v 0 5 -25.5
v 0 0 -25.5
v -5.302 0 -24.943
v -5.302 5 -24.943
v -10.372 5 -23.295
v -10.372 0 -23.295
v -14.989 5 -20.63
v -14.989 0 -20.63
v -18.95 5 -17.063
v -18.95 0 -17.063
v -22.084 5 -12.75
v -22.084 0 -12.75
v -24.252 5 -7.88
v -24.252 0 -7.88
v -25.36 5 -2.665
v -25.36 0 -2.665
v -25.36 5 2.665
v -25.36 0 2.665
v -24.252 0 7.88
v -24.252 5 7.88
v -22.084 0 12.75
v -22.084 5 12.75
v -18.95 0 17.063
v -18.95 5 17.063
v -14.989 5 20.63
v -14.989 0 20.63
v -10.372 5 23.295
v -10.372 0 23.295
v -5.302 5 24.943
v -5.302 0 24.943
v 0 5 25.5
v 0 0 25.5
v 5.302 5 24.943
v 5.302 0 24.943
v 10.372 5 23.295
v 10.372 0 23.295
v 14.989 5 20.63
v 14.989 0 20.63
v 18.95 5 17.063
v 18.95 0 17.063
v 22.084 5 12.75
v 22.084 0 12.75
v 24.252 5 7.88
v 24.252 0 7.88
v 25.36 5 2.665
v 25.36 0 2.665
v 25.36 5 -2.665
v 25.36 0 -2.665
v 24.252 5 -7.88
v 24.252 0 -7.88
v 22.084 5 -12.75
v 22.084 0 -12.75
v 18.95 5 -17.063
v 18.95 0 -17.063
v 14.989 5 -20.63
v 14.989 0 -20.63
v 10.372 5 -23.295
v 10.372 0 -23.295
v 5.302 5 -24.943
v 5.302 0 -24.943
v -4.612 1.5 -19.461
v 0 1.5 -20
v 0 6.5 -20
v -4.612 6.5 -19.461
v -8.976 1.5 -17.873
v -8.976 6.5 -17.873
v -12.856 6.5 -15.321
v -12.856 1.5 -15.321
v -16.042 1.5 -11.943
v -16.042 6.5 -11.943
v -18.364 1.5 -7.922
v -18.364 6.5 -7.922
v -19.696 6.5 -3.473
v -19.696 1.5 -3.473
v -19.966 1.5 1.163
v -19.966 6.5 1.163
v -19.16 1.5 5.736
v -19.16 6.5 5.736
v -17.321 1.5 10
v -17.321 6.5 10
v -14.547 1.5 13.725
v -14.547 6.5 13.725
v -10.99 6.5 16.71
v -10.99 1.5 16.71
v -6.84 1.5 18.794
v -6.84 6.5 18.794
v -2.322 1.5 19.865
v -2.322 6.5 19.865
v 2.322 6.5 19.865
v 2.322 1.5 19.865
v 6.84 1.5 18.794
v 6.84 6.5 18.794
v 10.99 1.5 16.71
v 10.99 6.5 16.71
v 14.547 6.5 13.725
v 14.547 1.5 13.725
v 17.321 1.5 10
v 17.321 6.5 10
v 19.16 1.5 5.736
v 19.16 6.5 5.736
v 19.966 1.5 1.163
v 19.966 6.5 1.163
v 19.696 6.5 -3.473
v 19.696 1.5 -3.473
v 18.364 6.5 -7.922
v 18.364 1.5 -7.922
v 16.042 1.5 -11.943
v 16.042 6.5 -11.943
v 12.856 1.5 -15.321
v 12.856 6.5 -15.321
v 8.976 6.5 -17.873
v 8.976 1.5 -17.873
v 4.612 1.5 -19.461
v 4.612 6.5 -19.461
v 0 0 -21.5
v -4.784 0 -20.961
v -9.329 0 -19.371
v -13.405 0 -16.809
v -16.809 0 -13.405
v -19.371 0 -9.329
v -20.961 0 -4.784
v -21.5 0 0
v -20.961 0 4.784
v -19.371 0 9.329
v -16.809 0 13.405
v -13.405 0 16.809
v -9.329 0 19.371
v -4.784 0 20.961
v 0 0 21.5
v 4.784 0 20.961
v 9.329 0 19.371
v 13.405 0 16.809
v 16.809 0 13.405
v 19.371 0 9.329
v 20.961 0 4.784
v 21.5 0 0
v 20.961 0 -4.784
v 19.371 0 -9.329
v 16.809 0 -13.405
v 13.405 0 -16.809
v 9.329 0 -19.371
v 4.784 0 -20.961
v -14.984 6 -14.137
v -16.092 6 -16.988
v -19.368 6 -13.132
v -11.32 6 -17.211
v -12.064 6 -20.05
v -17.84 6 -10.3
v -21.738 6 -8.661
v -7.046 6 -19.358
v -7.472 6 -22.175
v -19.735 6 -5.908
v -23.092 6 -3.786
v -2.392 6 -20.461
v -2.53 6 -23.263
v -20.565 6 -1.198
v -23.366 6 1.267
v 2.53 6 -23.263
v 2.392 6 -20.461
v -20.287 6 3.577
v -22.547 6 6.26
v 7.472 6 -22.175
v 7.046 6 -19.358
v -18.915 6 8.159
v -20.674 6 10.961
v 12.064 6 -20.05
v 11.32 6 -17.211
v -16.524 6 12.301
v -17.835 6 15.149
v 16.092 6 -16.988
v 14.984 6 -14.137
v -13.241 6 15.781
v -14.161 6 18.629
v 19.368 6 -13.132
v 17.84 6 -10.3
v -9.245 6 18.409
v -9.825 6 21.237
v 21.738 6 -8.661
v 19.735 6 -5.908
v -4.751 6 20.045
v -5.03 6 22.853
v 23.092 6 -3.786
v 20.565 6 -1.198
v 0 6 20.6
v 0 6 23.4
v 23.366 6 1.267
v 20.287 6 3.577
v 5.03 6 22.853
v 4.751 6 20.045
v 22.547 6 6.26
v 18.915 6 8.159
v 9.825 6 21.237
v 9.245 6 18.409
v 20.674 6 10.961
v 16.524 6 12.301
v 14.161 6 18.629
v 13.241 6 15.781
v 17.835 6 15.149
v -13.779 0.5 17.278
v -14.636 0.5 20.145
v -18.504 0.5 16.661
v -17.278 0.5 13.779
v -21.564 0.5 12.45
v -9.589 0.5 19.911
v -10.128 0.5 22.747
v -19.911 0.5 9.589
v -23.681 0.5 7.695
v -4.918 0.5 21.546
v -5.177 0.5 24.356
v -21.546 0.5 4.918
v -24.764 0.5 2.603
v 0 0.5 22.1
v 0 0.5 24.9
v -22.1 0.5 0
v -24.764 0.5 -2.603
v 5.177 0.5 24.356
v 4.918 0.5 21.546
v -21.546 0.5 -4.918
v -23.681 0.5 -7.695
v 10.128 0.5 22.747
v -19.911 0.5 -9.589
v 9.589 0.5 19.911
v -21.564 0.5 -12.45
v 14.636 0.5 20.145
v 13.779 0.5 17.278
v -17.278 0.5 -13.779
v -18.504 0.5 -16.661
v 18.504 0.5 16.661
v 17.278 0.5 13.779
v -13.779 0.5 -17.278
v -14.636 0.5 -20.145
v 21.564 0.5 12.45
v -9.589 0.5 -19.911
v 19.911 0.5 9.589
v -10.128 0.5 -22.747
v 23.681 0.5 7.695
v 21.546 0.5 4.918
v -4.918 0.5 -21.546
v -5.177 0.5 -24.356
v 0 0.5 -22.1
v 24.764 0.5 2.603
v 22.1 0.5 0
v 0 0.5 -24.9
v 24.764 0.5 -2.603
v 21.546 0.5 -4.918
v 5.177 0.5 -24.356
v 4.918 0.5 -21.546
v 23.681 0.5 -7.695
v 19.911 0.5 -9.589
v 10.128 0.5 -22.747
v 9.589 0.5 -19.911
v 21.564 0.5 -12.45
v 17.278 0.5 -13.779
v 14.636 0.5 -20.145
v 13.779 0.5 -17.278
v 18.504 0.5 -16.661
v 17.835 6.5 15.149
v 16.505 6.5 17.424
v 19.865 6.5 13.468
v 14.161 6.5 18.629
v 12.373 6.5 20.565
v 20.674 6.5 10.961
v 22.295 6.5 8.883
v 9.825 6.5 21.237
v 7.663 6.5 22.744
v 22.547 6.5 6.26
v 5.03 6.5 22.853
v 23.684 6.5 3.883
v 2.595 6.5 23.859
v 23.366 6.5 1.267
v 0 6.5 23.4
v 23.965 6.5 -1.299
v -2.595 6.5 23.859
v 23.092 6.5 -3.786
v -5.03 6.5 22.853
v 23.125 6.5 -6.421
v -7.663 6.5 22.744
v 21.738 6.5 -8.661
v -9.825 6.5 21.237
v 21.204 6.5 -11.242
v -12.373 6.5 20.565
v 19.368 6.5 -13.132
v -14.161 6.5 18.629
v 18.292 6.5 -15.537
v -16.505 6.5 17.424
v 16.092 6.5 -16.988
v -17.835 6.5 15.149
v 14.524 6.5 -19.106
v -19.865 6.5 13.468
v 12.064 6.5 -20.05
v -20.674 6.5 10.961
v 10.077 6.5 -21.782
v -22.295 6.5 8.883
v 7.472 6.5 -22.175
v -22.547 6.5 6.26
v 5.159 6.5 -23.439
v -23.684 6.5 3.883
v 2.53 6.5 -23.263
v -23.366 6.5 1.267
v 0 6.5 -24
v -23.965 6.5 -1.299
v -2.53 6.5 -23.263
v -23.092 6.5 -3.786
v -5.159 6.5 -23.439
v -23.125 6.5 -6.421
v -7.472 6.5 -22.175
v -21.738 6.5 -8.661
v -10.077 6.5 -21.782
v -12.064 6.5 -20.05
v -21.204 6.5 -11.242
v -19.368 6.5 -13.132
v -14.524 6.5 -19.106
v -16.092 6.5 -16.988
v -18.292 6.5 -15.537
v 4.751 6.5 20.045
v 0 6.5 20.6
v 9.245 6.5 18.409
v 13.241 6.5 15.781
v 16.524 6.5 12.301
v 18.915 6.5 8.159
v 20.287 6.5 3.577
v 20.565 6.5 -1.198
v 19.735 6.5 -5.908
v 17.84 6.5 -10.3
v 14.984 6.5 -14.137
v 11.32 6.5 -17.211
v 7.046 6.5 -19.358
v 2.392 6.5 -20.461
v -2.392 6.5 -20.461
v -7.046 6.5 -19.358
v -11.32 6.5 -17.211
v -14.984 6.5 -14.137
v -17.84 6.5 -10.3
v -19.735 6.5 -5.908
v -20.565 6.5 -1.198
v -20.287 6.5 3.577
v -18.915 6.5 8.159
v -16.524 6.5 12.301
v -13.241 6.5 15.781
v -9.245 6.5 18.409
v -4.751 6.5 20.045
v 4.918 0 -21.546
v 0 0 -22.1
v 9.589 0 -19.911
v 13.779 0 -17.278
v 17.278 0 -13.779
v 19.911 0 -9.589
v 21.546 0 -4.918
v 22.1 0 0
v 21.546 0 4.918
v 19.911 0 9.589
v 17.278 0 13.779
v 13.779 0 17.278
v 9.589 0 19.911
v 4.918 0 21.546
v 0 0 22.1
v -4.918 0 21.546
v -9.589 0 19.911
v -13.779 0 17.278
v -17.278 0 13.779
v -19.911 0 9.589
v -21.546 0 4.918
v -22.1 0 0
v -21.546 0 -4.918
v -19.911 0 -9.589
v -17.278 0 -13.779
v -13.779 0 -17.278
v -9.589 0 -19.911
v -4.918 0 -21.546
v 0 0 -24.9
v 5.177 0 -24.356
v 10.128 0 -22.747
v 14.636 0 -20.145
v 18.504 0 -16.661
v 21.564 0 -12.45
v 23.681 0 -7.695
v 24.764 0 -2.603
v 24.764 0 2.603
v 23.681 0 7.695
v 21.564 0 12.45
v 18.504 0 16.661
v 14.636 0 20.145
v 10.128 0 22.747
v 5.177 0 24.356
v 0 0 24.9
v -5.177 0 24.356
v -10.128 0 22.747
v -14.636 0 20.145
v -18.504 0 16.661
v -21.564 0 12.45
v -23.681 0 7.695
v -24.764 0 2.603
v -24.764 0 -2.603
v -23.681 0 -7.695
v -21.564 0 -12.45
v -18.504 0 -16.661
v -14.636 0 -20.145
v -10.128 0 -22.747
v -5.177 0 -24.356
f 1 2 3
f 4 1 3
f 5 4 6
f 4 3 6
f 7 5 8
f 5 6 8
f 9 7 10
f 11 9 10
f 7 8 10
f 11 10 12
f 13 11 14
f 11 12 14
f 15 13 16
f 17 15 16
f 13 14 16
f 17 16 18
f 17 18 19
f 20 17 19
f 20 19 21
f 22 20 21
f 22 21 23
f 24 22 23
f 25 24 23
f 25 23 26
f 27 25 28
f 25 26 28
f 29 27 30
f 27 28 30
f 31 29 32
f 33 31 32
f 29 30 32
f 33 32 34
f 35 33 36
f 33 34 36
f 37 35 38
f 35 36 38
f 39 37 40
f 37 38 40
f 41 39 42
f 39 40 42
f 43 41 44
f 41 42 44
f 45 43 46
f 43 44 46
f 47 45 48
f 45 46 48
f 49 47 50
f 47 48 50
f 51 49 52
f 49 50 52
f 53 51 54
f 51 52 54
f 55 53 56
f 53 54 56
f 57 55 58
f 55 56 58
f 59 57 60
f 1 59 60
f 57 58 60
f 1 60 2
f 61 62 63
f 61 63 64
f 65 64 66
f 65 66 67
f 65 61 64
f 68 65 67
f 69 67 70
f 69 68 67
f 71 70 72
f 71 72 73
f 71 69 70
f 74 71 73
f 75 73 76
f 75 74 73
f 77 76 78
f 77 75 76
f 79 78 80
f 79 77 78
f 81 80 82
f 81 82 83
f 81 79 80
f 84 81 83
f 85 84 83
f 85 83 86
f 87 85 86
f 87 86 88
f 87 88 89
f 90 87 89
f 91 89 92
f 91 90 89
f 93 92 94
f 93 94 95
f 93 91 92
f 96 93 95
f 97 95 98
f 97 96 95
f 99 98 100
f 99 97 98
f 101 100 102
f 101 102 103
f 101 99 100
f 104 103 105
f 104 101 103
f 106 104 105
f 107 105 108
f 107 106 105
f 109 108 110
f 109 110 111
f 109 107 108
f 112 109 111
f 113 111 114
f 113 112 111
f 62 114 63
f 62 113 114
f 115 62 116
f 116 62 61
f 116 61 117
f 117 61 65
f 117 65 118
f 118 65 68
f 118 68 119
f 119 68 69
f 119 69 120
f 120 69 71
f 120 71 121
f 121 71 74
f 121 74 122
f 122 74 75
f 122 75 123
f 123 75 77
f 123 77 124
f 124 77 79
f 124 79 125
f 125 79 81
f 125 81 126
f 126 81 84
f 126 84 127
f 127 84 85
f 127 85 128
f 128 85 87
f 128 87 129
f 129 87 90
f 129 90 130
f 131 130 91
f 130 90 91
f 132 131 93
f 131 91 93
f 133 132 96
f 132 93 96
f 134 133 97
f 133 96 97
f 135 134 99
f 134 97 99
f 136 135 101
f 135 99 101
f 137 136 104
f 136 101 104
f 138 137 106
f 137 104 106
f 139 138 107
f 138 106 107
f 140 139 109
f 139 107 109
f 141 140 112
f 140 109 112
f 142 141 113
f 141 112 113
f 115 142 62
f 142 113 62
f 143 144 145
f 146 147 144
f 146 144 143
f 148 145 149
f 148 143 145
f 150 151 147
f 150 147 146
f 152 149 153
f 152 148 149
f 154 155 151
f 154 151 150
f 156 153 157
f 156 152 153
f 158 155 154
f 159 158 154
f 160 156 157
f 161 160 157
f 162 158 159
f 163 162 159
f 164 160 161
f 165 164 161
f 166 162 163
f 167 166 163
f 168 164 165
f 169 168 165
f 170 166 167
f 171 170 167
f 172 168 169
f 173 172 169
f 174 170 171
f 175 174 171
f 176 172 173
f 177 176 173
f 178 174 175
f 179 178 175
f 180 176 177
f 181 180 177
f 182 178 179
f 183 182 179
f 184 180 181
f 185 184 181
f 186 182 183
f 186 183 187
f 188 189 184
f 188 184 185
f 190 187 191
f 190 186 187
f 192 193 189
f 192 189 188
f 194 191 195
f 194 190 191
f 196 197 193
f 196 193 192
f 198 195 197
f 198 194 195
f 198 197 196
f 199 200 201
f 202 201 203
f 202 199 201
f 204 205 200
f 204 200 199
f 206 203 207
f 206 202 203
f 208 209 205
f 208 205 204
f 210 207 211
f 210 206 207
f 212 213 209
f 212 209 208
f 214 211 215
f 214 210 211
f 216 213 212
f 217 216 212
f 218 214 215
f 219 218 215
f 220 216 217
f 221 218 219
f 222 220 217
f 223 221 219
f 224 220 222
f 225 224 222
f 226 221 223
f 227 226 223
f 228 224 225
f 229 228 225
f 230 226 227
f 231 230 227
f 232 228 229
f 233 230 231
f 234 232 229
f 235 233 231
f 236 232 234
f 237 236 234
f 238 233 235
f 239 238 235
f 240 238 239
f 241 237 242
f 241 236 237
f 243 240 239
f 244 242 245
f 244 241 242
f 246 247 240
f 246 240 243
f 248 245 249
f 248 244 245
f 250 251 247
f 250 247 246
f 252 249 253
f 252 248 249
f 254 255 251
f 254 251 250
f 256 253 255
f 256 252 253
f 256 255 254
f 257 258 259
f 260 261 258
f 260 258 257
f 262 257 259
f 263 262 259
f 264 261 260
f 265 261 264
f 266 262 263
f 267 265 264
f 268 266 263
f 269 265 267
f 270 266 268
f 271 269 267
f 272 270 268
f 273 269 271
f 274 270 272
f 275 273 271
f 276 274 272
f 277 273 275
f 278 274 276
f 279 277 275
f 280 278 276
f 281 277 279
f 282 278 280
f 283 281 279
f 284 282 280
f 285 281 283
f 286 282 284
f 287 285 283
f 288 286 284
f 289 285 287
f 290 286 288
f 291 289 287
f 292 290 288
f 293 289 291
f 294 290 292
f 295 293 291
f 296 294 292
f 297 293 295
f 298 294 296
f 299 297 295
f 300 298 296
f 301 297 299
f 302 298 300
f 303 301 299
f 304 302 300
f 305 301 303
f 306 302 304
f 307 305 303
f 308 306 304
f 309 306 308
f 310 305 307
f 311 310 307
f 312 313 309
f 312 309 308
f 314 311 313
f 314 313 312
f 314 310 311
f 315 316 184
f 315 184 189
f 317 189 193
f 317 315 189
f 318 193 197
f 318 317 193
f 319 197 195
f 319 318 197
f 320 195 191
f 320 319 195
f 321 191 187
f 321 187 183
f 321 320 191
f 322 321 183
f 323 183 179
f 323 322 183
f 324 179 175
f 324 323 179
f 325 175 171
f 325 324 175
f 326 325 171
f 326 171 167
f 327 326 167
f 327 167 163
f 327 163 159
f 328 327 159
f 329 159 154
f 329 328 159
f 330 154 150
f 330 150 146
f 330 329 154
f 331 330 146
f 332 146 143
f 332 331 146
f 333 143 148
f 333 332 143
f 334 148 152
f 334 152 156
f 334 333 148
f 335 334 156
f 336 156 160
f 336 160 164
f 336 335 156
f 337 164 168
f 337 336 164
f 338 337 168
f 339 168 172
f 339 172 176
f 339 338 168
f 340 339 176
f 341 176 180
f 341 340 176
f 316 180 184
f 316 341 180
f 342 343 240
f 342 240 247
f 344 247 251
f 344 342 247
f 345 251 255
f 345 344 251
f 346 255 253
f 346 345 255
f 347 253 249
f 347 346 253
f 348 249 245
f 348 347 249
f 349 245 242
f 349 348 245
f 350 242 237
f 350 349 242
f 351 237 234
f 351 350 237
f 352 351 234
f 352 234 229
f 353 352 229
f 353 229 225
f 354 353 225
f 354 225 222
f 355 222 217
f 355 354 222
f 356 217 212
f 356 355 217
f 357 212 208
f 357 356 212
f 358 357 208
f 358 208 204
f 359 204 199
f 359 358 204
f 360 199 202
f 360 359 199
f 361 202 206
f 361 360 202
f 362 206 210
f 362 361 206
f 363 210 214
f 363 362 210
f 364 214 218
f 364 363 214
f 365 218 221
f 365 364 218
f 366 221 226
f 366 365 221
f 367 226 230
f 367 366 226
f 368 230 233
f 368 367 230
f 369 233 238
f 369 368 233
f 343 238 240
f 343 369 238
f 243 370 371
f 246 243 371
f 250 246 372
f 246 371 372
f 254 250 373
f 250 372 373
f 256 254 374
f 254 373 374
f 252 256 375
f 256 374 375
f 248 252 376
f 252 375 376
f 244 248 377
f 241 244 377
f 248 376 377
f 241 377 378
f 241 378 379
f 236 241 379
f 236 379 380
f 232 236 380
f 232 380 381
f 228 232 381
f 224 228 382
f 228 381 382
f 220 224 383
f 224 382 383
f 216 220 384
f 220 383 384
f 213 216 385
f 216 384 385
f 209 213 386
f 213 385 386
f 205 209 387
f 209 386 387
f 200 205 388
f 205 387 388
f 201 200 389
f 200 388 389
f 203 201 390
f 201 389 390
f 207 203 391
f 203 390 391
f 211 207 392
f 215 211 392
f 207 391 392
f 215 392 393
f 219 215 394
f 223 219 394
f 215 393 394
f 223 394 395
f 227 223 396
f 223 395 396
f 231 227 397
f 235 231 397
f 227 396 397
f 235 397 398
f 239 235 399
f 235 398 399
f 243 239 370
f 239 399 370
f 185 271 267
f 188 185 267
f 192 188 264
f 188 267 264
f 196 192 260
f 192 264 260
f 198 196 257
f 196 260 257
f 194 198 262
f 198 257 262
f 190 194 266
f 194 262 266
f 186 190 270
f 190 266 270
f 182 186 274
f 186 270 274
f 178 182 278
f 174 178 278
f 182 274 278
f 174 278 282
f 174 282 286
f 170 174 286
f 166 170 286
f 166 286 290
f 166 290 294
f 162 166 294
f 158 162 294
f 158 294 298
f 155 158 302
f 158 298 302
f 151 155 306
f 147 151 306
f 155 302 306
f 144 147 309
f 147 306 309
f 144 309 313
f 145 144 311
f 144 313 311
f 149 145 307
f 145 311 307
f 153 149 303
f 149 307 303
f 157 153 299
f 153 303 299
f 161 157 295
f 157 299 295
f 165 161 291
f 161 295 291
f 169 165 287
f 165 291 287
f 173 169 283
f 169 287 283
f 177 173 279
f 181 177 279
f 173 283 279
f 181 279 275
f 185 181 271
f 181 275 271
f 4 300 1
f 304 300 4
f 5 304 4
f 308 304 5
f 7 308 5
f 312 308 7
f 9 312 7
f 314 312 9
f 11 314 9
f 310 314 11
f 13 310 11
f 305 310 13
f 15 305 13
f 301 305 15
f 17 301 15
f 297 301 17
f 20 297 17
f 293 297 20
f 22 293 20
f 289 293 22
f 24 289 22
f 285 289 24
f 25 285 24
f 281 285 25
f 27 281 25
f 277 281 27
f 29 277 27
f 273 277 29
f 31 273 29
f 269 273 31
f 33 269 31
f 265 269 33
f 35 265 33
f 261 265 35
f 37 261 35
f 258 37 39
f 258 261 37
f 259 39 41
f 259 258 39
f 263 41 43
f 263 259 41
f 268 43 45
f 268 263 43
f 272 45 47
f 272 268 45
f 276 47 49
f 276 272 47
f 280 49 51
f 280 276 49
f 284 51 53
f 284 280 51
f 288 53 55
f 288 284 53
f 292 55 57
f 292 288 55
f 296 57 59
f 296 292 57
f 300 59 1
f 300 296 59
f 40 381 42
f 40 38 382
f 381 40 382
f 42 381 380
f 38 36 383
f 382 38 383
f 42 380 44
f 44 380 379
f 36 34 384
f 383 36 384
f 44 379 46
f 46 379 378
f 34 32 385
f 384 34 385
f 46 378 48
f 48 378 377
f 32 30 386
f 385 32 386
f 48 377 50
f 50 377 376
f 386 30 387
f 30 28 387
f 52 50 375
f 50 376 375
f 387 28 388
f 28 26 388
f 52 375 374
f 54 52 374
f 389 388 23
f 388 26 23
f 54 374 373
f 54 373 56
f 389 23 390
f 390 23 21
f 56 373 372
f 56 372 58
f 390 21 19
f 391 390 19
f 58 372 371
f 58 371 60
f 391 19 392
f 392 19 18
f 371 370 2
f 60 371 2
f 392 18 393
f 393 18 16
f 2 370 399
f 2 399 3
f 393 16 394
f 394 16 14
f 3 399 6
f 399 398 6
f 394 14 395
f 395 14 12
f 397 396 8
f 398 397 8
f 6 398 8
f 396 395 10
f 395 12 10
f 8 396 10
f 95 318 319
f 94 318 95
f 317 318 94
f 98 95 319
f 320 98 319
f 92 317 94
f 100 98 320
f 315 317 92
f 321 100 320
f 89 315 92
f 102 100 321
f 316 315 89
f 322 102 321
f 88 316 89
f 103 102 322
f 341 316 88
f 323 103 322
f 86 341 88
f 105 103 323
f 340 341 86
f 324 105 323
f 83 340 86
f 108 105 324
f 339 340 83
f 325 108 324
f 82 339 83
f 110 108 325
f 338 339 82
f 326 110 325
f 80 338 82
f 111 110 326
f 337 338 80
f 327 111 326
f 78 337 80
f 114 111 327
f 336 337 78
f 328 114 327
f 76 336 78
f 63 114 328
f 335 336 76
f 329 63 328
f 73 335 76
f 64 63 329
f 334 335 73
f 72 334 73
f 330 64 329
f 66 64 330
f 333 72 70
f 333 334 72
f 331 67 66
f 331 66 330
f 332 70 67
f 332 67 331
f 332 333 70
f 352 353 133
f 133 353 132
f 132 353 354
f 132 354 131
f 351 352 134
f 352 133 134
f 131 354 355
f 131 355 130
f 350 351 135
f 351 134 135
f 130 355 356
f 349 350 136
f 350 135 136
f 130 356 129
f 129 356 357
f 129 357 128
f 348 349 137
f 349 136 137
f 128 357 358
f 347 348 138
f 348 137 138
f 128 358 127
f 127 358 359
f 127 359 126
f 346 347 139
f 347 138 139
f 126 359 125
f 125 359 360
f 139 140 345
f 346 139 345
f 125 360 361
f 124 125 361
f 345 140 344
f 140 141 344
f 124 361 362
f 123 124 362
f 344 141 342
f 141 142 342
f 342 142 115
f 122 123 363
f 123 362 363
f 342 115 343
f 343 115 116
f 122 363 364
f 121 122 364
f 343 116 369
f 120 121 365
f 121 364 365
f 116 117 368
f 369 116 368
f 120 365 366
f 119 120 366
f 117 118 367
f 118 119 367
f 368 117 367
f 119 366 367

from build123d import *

# Parameters (mm, degrees)
SKETCH_1_R          = 25.5
SKETCH_1_R_2        = 20
EXTRUDE_1_DEPTH     = 6.5
CHAMFER_1_SIZE      = 1.5
CHAMFER_2_SIZE      = 1.5
SKETCH_2_R          = 23.4
SKETCH_2_R_2        = 20.6
CUT_EXTRUDE_1_DEPTH = 0.5
SKETCH_3_R          = 24.9
SKETCH_3_R_2        = 22.1
CUT_EXTRUDE_2_DEPTH = 0.5


with BuildPart() as part:
    # 草图1 → 凸台-拉伸1 (new body)
    with BuildSketch(Plane(origin=(0, 0, 0), x_dir=(1, 0, 0), z_dir=(0, 1, 0))):
        with Locations(Location((0, 0, 0), (0, 0, 90))):
            Circle(SKETCH_1_R)
        with Locations(Location((0, 0, 0), (0, 0, 90))):
            Circle(SKETCH_1_R_2, mode=Mode.SUBTRACT)
    extrude(amount=EXTRUDE_1_DEPTH)

    # 倒角1
    chamfer_1_edges = [part.edges().sort_by_distance(p)[0] for p in [
        (0, 6.5, 25.5),
    ]]
    chamfer(chamfer_1_edges, length=CHAMFER_1_SIZE)

    # 倒角2
    chamfer_2_edges = [part.edges().sort_by_distance(p)[0] for p in [
        (0, 0, 20),
    ]]
    chamfer(chamfer_2_edges, length=CHAMFER_2_SIZE)

    # 草图2 → 切除-拉伸1 (cut)
    with BuildSketch(Plane(origin=(0, 6.5, 0), x_dir=(1, 0, 0), z_dir=(0, 1, 0))):
        with Locations(Location((0, 0, 0), (0, 0, 270))):
            Circle(SKETCH_2_R)
        with Locations(Location((0, 0, 0), (0, 0, 270))):
            Circle(SKETCH_2_R_2, mode=Mode.SUBTRACT)
    extrude(amount=-CUT_EXTRUDE_1_DEPTH, mode=Mode.SUBTRACT)

    # 草图3 → 切除-拉伸2 (cut)
    with BuildSketch(Plane.XZ):
        with Locations(Location((0, 0, 0), (0, 0, 270))):
            Circle(SKETCH_3_R)
        with Locations(Location((0, 0, 0), (0, 0, 270))):
            Circle(SKETCH_3_R_2, mode=Mode.SUBTRACT)
    extrude(amount=-CUT_EXTRUDE_2_DEPTH, mode=Mode.SUBTRACT)


solid = part.part
